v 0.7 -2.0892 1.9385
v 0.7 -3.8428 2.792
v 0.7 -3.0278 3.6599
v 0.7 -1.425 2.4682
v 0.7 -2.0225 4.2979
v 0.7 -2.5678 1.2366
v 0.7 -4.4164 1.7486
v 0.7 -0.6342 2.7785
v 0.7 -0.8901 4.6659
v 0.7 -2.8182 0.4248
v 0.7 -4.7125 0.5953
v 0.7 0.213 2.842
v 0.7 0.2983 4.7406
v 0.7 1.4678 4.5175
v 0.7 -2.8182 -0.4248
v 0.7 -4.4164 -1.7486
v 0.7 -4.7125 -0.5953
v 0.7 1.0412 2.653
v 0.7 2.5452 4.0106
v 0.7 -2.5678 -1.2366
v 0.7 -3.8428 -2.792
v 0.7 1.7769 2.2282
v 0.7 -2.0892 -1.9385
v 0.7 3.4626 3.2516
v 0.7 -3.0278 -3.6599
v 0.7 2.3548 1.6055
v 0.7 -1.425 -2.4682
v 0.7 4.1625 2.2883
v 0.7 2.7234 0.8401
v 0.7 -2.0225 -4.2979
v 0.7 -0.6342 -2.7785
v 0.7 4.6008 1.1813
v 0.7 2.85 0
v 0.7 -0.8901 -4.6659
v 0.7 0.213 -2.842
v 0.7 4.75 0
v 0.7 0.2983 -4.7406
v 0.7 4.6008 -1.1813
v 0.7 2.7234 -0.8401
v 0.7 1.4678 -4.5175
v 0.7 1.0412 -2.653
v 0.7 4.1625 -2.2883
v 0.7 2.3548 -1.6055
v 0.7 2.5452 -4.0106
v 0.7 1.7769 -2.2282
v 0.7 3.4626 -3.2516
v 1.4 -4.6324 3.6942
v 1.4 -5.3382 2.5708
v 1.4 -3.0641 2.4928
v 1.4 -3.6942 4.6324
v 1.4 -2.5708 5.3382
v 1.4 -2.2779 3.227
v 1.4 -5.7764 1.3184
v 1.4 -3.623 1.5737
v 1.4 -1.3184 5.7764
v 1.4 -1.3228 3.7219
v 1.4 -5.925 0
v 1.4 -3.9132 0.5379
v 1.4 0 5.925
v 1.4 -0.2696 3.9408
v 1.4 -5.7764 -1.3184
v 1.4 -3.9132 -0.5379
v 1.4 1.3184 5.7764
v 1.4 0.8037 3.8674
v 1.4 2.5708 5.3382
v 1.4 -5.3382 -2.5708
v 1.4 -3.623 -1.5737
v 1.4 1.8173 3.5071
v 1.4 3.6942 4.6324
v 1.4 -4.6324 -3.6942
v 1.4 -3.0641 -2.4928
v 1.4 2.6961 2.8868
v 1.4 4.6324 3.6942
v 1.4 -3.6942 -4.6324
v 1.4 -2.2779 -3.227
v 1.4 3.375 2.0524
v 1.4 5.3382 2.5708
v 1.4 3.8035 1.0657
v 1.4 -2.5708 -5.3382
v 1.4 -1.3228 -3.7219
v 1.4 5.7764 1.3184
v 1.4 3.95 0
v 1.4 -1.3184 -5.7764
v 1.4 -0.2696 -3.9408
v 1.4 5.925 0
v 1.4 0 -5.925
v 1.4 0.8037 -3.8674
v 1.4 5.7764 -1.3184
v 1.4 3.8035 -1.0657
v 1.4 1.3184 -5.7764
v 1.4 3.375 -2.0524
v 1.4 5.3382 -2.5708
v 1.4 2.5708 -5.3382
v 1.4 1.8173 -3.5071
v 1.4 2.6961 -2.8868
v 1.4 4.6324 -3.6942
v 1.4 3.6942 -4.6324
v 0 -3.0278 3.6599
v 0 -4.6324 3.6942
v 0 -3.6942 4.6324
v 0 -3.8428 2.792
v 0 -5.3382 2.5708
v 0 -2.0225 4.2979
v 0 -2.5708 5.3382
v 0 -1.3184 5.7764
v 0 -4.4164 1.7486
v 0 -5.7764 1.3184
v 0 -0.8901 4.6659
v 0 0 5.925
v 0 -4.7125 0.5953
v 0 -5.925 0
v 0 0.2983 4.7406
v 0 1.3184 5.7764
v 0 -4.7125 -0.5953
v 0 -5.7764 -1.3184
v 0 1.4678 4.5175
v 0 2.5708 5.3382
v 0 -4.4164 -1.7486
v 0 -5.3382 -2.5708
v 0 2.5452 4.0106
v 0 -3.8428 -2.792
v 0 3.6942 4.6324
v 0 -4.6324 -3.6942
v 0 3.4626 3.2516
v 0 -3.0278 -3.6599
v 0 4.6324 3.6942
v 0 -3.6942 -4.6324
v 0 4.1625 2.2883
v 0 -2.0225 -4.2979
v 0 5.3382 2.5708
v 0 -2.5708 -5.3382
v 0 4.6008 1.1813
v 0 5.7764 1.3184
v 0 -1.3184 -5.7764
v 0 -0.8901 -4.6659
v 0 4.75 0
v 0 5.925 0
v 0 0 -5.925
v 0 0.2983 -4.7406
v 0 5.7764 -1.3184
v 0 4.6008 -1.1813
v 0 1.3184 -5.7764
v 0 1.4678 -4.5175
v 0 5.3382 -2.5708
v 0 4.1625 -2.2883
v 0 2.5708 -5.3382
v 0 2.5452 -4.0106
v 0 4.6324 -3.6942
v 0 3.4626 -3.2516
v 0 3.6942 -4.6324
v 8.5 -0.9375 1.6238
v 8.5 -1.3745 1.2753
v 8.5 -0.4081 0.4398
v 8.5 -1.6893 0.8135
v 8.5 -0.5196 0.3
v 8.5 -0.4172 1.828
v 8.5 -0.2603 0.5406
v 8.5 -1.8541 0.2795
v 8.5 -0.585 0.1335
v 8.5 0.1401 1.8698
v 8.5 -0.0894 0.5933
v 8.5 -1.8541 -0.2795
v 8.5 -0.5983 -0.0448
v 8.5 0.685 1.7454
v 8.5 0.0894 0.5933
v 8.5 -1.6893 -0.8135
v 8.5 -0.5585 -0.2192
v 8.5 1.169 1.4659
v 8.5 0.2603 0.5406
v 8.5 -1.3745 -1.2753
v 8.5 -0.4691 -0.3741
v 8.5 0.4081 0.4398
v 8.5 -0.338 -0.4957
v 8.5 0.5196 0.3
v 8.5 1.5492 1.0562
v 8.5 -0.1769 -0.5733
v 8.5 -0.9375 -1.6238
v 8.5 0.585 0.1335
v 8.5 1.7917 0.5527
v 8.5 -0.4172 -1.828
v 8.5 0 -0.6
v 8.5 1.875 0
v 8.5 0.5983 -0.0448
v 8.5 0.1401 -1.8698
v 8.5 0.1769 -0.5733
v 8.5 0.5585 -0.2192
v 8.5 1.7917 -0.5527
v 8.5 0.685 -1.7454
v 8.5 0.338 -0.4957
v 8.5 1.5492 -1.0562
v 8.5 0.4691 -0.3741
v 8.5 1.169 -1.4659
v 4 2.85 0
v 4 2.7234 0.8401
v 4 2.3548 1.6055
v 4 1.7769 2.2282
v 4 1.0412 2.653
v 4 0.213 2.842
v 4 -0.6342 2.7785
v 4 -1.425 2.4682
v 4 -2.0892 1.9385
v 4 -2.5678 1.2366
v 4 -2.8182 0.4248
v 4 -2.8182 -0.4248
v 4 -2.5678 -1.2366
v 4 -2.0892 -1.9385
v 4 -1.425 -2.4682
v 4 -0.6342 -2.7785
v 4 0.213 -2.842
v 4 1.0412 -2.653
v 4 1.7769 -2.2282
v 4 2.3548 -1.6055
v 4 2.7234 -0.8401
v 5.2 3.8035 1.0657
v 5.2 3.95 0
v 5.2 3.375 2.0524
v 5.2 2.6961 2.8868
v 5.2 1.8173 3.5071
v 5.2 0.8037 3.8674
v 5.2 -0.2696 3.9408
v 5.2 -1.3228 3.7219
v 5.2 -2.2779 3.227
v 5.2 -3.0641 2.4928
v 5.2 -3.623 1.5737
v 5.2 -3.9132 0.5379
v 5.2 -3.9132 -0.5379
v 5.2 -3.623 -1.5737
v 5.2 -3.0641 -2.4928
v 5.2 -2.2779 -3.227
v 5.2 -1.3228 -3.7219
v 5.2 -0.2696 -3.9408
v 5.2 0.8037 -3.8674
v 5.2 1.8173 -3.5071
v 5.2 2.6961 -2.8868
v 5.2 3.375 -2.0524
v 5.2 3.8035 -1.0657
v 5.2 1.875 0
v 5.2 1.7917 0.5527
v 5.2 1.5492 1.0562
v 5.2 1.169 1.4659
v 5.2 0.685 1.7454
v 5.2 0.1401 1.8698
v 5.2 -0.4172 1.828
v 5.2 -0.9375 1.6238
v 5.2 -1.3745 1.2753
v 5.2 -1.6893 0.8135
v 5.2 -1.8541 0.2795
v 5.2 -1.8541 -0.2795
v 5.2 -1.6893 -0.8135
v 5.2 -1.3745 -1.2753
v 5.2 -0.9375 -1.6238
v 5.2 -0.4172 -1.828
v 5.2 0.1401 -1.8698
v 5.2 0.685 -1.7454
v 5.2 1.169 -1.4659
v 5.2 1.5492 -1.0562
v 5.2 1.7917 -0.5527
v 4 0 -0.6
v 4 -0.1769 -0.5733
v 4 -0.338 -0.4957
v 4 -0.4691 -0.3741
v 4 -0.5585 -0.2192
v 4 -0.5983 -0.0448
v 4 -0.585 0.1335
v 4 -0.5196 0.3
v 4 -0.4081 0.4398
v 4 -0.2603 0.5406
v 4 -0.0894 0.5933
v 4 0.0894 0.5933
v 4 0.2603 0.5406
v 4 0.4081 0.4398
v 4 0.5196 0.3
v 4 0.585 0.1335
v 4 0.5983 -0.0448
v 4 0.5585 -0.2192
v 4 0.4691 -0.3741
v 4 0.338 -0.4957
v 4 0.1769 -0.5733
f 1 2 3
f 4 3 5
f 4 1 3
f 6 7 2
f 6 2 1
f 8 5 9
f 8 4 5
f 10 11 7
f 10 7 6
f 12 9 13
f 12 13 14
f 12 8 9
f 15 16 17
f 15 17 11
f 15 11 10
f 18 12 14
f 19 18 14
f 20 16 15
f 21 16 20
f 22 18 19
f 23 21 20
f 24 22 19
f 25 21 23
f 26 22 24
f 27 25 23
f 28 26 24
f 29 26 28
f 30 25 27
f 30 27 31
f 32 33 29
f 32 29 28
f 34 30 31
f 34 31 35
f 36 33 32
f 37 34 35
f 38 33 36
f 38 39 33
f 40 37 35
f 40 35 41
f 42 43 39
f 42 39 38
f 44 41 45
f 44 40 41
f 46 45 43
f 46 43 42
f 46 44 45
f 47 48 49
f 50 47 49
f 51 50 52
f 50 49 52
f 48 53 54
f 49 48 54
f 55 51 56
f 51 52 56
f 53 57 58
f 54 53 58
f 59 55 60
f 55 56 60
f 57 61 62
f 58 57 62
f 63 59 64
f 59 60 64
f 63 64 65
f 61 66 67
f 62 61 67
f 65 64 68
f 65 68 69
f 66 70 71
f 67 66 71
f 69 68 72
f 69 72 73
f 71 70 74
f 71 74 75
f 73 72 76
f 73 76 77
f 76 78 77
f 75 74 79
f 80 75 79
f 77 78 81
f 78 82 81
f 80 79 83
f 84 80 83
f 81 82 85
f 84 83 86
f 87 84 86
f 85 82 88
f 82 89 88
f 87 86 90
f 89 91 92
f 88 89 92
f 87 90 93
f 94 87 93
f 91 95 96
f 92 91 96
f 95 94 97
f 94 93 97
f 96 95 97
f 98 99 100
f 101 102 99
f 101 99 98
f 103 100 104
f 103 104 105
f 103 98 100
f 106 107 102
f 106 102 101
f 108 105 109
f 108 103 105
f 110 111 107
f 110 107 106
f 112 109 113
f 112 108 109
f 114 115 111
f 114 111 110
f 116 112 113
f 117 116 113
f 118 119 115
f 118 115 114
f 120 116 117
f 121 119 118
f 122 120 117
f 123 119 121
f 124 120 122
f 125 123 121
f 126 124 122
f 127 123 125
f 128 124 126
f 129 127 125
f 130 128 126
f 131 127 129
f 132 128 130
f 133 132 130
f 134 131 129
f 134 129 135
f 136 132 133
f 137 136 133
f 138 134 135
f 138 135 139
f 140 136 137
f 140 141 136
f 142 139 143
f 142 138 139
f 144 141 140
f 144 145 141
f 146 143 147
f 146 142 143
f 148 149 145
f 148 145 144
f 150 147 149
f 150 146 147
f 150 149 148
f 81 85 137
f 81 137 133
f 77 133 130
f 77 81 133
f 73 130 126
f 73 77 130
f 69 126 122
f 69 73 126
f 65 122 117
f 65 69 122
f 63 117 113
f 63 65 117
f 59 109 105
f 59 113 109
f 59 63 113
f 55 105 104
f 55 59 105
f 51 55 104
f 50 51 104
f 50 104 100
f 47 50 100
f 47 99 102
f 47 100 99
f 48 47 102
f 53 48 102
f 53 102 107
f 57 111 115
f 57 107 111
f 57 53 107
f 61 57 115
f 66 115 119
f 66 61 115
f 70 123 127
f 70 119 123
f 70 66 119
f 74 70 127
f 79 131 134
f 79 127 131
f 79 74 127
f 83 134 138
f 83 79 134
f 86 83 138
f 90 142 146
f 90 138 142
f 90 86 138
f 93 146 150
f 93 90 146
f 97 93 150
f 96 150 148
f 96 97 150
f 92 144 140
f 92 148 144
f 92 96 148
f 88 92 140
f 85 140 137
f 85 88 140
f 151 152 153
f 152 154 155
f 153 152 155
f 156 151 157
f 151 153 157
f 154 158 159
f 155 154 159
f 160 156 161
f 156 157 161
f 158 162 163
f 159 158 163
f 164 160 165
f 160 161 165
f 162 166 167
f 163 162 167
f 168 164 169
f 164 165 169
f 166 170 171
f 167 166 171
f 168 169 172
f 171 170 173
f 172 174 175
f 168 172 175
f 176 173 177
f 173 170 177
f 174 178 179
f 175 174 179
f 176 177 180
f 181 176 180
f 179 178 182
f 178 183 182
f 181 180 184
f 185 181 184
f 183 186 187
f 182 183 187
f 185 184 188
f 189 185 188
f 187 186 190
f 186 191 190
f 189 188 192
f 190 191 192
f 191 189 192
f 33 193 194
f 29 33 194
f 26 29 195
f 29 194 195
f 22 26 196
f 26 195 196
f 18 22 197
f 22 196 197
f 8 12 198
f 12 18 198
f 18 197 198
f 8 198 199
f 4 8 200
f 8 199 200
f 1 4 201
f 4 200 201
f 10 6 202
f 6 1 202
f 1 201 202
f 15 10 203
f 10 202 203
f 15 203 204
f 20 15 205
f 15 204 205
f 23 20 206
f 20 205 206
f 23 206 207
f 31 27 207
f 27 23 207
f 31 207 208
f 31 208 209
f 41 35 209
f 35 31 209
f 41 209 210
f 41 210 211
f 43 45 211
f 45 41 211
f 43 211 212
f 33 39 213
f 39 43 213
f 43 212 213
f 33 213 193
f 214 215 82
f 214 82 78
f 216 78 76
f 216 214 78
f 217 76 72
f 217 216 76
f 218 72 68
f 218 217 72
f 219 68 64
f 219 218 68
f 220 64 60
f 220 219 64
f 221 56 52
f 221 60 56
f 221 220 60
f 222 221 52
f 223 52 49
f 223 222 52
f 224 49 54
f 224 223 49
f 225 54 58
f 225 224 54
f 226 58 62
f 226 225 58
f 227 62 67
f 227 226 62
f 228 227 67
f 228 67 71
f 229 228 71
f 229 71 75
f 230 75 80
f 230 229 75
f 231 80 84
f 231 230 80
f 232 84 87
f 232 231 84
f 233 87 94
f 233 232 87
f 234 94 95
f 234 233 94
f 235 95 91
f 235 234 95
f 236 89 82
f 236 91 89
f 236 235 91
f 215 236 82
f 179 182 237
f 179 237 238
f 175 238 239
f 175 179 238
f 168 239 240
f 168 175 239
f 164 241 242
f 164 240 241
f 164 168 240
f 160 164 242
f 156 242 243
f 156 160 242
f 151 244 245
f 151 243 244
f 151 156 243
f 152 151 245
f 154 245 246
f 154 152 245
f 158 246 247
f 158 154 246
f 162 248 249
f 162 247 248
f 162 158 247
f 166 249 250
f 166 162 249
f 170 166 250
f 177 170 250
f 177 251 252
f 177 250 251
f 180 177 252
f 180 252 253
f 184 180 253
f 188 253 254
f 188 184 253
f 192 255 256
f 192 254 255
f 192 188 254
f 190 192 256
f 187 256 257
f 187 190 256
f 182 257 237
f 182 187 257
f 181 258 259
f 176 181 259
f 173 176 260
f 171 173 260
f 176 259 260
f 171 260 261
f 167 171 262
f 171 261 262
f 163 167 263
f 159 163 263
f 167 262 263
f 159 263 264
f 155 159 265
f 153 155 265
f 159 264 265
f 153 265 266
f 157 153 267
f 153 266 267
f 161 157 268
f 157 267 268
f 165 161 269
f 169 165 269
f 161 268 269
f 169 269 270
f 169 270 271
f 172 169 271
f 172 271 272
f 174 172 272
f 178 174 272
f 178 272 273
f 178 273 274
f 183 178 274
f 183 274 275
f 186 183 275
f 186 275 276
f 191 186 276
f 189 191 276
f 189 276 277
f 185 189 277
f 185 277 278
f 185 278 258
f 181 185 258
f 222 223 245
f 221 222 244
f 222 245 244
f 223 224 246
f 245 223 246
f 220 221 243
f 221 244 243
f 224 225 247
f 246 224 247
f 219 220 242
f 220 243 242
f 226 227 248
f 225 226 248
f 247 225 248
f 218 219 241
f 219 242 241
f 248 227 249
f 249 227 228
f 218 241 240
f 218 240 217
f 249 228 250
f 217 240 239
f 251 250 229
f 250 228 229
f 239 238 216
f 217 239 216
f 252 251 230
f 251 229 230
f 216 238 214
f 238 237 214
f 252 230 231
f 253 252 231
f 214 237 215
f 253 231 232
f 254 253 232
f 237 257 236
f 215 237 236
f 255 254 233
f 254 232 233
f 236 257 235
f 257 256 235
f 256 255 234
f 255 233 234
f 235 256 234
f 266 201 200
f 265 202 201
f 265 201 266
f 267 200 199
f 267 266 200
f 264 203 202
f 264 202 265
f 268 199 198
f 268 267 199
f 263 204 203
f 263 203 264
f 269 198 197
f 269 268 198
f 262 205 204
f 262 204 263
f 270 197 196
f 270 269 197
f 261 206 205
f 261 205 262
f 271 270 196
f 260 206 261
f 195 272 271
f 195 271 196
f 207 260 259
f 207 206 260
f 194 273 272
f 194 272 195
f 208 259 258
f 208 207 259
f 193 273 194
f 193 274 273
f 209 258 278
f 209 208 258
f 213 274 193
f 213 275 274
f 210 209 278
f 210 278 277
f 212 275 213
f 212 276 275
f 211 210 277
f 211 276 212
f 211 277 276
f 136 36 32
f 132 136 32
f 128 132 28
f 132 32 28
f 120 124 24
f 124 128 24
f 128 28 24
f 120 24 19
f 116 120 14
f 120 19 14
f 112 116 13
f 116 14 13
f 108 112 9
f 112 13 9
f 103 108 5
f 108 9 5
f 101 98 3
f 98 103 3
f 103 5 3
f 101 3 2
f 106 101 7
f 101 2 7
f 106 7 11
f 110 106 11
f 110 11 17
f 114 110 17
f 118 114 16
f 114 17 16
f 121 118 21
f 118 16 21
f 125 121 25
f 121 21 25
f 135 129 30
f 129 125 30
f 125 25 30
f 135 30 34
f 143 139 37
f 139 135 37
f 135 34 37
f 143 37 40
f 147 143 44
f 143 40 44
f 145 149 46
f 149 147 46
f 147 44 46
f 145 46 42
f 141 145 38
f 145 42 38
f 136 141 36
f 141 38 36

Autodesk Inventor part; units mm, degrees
ref_plane "YZ Plane" through (0, 0, 0) normal (1, 0, 0) x (0, 1, 0)
ref_plane "XZ Plane" through (0, 0, 0) normal (0, 1, 0) x (-1, 0, 0)
ref_plane "XY Plane" through (0, 0, 0) normal (0, 0, 1) x (1, 0, 0)
sketch "Sketch1" plane through (0, 0, 0) normal (0, 0, 1) x (1, 0, 0)
  line L0 (0, 4.75) -> (0, 5.925)
  line L1 (0, 5.925) -> (1.4, 5.925)
  line L2 (1.4, 5.925) -> (1.4, 3.95)
  line L3 (1.4, 3.95) -> (5.2, 3.95)
  line L4 (5.2, 3.95) -> (5.2, 1.875)
  line L5 (5.2, 1.875) -> (8.5, 1.875)
  line L6 (8.5, 1.875) -> (8.5, 0)
  line L7 (8.5, 0) -> (0, 0)
  line L8 (0, 4.75) -> (0.7, 4.75)
  line L9 (0.7, 4.75) -> (0.7, 2.85)
  line L10 (0.7, 2.85) -> (4, 2.85)
  line L11 (4, 2.85) -> (4, 0)
  dimension "d0" = 8.5
  dimension "d1" = 11.85
  dimension "d2" = 1.4
  dimension "d3" = 5.2
  dimension "d4" = 7.9
  dimension "d5" = 3.75
  dimension "d6" = 9.5
  dimension "d7" = 5.7
  dimension "d8" = 0.7
  dimension "d9" = 4
revolve "Revolution1" add sketch "Sketch1" angle 360 about axis through (8.5, 0, 0) along (-1, 0, 0)
hole "Hole1" at (8.5, 0, 0) direction (-1, 0, 0) diameter 1.2 end through all
properties part number "Hitec HS-225MG gear 3"
